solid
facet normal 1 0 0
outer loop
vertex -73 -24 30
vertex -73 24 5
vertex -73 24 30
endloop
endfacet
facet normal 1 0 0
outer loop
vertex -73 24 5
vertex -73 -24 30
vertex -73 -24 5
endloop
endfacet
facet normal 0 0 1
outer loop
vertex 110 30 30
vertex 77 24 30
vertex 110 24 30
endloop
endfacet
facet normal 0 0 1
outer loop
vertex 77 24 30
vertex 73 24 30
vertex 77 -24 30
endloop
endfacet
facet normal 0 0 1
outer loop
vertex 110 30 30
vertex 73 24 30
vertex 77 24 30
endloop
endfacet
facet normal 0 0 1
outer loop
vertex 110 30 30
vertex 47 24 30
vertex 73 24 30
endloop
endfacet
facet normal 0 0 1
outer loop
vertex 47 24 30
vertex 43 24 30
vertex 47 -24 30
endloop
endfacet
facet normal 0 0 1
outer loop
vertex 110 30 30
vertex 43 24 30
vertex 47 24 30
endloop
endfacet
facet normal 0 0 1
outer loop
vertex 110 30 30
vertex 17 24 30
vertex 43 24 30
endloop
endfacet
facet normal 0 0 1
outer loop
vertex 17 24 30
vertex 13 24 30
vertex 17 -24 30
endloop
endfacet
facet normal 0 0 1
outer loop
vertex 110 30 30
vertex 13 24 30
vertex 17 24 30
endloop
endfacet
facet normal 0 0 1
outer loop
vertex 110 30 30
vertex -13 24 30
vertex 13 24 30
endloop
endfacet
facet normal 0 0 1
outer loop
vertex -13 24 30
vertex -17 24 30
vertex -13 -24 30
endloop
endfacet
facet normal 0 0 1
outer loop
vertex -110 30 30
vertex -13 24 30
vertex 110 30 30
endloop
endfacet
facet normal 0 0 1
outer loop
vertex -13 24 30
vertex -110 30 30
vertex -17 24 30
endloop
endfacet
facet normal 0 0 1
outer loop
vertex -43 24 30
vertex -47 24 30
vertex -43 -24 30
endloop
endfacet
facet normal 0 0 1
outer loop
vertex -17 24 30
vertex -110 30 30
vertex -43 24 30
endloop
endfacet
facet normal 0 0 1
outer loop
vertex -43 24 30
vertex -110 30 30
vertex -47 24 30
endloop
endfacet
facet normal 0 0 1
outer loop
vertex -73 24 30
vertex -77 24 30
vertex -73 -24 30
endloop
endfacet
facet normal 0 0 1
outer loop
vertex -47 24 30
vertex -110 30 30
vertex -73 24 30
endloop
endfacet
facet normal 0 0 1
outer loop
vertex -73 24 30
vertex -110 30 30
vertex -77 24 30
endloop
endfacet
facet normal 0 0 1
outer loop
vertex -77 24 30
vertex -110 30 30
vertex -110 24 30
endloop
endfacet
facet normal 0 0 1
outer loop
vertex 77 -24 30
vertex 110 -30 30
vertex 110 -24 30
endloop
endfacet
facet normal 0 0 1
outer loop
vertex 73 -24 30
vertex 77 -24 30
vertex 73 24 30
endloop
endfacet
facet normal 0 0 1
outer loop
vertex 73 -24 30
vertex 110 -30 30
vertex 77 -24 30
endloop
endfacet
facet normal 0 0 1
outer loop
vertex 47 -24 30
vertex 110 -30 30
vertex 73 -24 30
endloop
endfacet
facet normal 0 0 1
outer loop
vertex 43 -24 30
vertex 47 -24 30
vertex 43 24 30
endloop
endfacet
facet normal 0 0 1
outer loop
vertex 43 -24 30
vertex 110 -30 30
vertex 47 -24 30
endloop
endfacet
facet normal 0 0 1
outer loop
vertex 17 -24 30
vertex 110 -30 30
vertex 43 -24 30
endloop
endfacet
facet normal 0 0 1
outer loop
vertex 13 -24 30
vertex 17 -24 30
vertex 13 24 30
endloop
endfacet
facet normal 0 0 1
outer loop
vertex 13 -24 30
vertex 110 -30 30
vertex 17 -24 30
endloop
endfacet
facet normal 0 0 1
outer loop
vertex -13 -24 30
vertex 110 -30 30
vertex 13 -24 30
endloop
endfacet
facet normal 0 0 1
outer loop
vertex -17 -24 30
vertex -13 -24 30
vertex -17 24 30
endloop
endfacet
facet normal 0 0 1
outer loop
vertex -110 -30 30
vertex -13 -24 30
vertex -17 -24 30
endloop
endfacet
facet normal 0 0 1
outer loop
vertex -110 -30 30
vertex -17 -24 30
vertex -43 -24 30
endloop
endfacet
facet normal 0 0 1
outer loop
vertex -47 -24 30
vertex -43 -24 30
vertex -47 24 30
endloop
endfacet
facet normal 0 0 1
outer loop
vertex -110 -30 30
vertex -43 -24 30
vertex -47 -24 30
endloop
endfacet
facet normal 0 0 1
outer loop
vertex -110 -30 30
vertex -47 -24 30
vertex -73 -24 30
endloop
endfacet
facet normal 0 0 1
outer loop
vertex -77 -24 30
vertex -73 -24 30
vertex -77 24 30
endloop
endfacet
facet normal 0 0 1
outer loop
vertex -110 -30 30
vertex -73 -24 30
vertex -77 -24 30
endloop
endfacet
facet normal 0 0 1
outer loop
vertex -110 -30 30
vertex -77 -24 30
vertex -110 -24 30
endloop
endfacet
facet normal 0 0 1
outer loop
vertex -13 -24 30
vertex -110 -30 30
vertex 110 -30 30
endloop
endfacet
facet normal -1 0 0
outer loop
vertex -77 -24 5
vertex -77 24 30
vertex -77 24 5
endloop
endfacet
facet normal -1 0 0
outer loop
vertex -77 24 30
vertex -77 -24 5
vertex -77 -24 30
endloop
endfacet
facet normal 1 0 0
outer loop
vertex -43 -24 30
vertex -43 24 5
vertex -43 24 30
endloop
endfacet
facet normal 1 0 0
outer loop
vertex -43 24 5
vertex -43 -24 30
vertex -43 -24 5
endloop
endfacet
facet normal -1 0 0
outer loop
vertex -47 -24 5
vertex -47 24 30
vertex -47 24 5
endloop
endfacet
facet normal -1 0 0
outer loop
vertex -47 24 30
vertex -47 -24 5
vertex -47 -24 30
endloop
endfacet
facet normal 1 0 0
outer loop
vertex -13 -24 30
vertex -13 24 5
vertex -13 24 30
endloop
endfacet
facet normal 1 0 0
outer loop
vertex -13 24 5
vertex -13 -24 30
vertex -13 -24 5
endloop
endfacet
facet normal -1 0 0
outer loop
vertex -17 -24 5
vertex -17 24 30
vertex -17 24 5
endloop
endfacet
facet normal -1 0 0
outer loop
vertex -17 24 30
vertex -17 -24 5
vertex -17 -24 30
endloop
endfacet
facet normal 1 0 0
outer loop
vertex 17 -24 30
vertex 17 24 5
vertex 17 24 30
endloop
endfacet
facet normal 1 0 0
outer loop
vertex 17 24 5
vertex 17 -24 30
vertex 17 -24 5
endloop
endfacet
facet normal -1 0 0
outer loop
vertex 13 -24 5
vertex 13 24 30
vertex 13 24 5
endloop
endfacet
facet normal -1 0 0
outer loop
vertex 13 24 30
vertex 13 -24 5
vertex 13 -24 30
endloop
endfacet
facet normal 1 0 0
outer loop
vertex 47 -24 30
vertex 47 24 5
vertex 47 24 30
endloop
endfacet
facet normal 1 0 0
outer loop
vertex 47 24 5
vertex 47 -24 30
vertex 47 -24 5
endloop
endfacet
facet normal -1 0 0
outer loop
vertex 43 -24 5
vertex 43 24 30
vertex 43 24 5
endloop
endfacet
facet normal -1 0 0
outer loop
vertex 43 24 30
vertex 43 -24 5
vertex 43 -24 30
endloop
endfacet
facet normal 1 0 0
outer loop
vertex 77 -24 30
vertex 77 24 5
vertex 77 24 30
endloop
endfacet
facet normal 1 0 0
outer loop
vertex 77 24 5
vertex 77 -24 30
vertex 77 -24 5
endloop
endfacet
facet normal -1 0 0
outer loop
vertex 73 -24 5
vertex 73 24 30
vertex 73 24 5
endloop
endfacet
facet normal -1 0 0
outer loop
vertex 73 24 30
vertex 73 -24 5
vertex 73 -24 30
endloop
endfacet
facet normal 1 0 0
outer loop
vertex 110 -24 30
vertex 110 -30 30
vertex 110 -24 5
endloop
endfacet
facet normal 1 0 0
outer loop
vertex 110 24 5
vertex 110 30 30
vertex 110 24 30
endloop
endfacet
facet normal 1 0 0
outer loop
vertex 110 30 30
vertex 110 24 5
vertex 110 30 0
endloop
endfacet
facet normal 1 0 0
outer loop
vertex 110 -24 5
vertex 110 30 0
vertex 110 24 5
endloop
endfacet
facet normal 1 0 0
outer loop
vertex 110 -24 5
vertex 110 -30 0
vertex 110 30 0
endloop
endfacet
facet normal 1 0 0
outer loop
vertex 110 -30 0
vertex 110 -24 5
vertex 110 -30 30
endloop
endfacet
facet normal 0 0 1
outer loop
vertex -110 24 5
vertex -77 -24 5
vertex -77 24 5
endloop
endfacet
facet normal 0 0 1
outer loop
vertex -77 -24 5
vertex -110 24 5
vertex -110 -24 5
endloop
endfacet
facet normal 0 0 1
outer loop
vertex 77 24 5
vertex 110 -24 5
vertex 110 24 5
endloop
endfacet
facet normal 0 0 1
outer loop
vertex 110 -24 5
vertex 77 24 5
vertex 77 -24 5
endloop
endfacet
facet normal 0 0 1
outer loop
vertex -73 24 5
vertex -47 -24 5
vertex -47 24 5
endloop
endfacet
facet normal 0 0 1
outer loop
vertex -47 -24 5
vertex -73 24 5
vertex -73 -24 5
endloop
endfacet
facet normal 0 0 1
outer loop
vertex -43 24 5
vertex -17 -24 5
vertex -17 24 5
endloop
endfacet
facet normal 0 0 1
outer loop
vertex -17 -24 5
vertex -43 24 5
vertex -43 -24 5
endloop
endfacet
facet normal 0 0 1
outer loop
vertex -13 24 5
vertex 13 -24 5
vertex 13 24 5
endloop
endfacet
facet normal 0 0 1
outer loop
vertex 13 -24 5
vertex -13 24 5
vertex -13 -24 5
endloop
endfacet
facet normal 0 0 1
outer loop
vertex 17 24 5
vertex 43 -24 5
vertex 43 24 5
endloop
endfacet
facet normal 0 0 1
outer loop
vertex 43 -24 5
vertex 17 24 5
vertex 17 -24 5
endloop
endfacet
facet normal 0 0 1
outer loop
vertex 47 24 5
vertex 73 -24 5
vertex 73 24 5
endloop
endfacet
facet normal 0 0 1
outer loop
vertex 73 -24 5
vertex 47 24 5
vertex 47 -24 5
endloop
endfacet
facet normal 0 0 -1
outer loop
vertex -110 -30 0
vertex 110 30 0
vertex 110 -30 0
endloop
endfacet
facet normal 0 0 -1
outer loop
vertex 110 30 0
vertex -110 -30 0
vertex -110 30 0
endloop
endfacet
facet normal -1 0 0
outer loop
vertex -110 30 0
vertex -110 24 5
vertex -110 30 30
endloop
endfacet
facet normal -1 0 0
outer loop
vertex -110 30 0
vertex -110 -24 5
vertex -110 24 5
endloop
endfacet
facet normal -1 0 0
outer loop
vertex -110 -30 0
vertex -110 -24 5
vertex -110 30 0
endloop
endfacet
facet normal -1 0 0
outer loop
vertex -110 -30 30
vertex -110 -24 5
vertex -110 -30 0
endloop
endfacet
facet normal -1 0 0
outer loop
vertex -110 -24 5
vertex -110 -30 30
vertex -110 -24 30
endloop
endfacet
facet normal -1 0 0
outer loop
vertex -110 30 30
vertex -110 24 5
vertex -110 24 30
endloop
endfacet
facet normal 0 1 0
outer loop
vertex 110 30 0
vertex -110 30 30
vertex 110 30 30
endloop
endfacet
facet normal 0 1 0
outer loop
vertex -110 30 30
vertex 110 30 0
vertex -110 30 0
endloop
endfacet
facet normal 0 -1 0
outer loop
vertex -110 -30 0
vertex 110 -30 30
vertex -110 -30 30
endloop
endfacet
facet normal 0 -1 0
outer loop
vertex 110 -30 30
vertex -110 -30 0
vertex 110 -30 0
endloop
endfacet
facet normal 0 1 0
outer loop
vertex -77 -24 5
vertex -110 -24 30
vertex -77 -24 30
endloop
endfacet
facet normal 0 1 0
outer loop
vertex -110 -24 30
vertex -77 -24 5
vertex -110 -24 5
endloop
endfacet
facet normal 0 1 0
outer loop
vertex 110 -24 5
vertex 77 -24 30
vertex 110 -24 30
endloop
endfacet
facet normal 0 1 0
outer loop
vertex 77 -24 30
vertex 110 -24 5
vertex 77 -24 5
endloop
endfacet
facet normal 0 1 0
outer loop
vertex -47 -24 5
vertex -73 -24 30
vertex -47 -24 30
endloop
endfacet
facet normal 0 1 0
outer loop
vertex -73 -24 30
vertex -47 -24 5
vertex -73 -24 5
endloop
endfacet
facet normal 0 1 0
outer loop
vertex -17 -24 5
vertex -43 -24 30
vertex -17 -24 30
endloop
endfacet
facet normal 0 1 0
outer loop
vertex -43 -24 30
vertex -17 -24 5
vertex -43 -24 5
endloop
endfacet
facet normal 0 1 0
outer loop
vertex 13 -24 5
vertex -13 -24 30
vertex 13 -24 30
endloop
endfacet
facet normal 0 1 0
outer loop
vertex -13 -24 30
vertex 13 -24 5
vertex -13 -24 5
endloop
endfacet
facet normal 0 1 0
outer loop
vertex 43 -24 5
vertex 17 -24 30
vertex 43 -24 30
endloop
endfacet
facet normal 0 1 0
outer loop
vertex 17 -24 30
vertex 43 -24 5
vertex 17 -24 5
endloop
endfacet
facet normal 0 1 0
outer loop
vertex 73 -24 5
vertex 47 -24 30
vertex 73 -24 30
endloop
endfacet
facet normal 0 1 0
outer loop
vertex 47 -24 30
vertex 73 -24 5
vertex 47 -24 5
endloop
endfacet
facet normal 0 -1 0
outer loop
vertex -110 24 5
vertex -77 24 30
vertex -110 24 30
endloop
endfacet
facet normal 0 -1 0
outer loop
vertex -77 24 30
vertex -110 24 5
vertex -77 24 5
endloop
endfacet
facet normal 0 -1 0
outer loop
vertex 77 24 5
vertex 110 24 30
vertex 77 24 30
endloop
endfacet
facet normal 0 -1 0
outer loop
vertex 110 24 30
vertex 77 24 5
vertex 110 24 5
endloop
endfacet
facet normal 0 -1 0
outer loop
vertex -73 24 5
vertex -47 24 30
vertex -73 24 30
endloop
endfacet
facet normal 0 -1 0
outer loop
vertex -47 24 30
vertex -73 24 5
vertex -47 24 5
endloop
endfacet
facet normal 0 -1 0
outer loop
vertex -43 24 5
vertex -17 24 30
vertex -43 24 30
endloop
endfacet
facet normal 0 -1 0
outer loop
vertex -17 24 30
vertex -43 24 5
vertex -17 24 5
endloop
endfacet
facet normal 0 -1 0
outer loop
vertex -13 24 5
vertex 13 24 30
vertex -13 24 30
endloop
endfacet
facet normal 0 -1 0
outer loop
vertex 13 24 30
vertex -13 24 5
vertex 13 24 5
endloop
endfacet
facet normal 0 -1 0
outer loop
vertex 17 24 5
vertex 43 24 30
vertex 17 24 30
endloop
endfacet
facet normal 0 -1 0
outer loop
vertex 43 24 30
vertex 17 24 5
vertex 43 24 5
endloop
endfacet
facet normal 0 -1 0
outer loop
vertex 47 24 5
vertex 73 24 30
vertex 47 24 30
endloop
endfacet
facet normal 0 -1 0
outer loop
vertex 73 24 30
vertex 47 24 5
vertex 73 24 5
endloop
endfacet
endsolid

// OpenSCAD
$fn = 32;

// ----------------------------------------------------------------------
// Rib frame 220 x 60 x 30
// 6 ribs at 30 mm pitch
// ----------------------------------------------------------------------

// --- parameters (mm) ---
frame = [220, 60, 5];  // base plate size (x, y, z)
rail_w = 6;            // side rail width
ribs = 6;              // number of ribs
rib_t = 4;             // rib thickness
rib_h = 25;            // rib height above the base plate
pitch = 30;            // pitch between rib centres

// --- derived feature positions (mm) ---
span = (ribs - 1) * pitch;          // = 150   distance between the outer ribs
origin_x = -span / 2;               // = -75   X of the first rib
rib_len = frame[1] - 2 * rail_w + 2;  // = 50   rib length, 1 mm into each rail
feature_centers = [
  [origin_x + 0 * pitch, 0],
  [origin_x + 1 * pitch, 0],
  [origin_x + 2 * pitch, 0],
  [origin_x + 3 * pitch, 0],
  [origin_x + 4 * pitch, 0],
  [origin_x + 5 * pitch, 0]
];   // rib centre line, drives the rib loop

// base plate, two side rails, then the ribs read straight off feature_centers
union() {
  translate([-frame[0] / 2, -frame[1] / 2, 0]) cube(frame);
  translate([-frame[0] / 2, -frame[1] / 2, 0]) cube([frame[0], rail_w, frame[2] + rib_h]);
  translate([-frame[0] / 2, frame[1] / 2 - rail_w, 0]) cube([frame[0], rail_w, frame[2] + rib_h]);
  for (centre = feature_centers)
    translate([centre[0] - rib_t / 2, centre[1] - rib_len / 2, frame[2] - 1])
      cube([rib_t, rib_len, rib_h + 1]);
}
